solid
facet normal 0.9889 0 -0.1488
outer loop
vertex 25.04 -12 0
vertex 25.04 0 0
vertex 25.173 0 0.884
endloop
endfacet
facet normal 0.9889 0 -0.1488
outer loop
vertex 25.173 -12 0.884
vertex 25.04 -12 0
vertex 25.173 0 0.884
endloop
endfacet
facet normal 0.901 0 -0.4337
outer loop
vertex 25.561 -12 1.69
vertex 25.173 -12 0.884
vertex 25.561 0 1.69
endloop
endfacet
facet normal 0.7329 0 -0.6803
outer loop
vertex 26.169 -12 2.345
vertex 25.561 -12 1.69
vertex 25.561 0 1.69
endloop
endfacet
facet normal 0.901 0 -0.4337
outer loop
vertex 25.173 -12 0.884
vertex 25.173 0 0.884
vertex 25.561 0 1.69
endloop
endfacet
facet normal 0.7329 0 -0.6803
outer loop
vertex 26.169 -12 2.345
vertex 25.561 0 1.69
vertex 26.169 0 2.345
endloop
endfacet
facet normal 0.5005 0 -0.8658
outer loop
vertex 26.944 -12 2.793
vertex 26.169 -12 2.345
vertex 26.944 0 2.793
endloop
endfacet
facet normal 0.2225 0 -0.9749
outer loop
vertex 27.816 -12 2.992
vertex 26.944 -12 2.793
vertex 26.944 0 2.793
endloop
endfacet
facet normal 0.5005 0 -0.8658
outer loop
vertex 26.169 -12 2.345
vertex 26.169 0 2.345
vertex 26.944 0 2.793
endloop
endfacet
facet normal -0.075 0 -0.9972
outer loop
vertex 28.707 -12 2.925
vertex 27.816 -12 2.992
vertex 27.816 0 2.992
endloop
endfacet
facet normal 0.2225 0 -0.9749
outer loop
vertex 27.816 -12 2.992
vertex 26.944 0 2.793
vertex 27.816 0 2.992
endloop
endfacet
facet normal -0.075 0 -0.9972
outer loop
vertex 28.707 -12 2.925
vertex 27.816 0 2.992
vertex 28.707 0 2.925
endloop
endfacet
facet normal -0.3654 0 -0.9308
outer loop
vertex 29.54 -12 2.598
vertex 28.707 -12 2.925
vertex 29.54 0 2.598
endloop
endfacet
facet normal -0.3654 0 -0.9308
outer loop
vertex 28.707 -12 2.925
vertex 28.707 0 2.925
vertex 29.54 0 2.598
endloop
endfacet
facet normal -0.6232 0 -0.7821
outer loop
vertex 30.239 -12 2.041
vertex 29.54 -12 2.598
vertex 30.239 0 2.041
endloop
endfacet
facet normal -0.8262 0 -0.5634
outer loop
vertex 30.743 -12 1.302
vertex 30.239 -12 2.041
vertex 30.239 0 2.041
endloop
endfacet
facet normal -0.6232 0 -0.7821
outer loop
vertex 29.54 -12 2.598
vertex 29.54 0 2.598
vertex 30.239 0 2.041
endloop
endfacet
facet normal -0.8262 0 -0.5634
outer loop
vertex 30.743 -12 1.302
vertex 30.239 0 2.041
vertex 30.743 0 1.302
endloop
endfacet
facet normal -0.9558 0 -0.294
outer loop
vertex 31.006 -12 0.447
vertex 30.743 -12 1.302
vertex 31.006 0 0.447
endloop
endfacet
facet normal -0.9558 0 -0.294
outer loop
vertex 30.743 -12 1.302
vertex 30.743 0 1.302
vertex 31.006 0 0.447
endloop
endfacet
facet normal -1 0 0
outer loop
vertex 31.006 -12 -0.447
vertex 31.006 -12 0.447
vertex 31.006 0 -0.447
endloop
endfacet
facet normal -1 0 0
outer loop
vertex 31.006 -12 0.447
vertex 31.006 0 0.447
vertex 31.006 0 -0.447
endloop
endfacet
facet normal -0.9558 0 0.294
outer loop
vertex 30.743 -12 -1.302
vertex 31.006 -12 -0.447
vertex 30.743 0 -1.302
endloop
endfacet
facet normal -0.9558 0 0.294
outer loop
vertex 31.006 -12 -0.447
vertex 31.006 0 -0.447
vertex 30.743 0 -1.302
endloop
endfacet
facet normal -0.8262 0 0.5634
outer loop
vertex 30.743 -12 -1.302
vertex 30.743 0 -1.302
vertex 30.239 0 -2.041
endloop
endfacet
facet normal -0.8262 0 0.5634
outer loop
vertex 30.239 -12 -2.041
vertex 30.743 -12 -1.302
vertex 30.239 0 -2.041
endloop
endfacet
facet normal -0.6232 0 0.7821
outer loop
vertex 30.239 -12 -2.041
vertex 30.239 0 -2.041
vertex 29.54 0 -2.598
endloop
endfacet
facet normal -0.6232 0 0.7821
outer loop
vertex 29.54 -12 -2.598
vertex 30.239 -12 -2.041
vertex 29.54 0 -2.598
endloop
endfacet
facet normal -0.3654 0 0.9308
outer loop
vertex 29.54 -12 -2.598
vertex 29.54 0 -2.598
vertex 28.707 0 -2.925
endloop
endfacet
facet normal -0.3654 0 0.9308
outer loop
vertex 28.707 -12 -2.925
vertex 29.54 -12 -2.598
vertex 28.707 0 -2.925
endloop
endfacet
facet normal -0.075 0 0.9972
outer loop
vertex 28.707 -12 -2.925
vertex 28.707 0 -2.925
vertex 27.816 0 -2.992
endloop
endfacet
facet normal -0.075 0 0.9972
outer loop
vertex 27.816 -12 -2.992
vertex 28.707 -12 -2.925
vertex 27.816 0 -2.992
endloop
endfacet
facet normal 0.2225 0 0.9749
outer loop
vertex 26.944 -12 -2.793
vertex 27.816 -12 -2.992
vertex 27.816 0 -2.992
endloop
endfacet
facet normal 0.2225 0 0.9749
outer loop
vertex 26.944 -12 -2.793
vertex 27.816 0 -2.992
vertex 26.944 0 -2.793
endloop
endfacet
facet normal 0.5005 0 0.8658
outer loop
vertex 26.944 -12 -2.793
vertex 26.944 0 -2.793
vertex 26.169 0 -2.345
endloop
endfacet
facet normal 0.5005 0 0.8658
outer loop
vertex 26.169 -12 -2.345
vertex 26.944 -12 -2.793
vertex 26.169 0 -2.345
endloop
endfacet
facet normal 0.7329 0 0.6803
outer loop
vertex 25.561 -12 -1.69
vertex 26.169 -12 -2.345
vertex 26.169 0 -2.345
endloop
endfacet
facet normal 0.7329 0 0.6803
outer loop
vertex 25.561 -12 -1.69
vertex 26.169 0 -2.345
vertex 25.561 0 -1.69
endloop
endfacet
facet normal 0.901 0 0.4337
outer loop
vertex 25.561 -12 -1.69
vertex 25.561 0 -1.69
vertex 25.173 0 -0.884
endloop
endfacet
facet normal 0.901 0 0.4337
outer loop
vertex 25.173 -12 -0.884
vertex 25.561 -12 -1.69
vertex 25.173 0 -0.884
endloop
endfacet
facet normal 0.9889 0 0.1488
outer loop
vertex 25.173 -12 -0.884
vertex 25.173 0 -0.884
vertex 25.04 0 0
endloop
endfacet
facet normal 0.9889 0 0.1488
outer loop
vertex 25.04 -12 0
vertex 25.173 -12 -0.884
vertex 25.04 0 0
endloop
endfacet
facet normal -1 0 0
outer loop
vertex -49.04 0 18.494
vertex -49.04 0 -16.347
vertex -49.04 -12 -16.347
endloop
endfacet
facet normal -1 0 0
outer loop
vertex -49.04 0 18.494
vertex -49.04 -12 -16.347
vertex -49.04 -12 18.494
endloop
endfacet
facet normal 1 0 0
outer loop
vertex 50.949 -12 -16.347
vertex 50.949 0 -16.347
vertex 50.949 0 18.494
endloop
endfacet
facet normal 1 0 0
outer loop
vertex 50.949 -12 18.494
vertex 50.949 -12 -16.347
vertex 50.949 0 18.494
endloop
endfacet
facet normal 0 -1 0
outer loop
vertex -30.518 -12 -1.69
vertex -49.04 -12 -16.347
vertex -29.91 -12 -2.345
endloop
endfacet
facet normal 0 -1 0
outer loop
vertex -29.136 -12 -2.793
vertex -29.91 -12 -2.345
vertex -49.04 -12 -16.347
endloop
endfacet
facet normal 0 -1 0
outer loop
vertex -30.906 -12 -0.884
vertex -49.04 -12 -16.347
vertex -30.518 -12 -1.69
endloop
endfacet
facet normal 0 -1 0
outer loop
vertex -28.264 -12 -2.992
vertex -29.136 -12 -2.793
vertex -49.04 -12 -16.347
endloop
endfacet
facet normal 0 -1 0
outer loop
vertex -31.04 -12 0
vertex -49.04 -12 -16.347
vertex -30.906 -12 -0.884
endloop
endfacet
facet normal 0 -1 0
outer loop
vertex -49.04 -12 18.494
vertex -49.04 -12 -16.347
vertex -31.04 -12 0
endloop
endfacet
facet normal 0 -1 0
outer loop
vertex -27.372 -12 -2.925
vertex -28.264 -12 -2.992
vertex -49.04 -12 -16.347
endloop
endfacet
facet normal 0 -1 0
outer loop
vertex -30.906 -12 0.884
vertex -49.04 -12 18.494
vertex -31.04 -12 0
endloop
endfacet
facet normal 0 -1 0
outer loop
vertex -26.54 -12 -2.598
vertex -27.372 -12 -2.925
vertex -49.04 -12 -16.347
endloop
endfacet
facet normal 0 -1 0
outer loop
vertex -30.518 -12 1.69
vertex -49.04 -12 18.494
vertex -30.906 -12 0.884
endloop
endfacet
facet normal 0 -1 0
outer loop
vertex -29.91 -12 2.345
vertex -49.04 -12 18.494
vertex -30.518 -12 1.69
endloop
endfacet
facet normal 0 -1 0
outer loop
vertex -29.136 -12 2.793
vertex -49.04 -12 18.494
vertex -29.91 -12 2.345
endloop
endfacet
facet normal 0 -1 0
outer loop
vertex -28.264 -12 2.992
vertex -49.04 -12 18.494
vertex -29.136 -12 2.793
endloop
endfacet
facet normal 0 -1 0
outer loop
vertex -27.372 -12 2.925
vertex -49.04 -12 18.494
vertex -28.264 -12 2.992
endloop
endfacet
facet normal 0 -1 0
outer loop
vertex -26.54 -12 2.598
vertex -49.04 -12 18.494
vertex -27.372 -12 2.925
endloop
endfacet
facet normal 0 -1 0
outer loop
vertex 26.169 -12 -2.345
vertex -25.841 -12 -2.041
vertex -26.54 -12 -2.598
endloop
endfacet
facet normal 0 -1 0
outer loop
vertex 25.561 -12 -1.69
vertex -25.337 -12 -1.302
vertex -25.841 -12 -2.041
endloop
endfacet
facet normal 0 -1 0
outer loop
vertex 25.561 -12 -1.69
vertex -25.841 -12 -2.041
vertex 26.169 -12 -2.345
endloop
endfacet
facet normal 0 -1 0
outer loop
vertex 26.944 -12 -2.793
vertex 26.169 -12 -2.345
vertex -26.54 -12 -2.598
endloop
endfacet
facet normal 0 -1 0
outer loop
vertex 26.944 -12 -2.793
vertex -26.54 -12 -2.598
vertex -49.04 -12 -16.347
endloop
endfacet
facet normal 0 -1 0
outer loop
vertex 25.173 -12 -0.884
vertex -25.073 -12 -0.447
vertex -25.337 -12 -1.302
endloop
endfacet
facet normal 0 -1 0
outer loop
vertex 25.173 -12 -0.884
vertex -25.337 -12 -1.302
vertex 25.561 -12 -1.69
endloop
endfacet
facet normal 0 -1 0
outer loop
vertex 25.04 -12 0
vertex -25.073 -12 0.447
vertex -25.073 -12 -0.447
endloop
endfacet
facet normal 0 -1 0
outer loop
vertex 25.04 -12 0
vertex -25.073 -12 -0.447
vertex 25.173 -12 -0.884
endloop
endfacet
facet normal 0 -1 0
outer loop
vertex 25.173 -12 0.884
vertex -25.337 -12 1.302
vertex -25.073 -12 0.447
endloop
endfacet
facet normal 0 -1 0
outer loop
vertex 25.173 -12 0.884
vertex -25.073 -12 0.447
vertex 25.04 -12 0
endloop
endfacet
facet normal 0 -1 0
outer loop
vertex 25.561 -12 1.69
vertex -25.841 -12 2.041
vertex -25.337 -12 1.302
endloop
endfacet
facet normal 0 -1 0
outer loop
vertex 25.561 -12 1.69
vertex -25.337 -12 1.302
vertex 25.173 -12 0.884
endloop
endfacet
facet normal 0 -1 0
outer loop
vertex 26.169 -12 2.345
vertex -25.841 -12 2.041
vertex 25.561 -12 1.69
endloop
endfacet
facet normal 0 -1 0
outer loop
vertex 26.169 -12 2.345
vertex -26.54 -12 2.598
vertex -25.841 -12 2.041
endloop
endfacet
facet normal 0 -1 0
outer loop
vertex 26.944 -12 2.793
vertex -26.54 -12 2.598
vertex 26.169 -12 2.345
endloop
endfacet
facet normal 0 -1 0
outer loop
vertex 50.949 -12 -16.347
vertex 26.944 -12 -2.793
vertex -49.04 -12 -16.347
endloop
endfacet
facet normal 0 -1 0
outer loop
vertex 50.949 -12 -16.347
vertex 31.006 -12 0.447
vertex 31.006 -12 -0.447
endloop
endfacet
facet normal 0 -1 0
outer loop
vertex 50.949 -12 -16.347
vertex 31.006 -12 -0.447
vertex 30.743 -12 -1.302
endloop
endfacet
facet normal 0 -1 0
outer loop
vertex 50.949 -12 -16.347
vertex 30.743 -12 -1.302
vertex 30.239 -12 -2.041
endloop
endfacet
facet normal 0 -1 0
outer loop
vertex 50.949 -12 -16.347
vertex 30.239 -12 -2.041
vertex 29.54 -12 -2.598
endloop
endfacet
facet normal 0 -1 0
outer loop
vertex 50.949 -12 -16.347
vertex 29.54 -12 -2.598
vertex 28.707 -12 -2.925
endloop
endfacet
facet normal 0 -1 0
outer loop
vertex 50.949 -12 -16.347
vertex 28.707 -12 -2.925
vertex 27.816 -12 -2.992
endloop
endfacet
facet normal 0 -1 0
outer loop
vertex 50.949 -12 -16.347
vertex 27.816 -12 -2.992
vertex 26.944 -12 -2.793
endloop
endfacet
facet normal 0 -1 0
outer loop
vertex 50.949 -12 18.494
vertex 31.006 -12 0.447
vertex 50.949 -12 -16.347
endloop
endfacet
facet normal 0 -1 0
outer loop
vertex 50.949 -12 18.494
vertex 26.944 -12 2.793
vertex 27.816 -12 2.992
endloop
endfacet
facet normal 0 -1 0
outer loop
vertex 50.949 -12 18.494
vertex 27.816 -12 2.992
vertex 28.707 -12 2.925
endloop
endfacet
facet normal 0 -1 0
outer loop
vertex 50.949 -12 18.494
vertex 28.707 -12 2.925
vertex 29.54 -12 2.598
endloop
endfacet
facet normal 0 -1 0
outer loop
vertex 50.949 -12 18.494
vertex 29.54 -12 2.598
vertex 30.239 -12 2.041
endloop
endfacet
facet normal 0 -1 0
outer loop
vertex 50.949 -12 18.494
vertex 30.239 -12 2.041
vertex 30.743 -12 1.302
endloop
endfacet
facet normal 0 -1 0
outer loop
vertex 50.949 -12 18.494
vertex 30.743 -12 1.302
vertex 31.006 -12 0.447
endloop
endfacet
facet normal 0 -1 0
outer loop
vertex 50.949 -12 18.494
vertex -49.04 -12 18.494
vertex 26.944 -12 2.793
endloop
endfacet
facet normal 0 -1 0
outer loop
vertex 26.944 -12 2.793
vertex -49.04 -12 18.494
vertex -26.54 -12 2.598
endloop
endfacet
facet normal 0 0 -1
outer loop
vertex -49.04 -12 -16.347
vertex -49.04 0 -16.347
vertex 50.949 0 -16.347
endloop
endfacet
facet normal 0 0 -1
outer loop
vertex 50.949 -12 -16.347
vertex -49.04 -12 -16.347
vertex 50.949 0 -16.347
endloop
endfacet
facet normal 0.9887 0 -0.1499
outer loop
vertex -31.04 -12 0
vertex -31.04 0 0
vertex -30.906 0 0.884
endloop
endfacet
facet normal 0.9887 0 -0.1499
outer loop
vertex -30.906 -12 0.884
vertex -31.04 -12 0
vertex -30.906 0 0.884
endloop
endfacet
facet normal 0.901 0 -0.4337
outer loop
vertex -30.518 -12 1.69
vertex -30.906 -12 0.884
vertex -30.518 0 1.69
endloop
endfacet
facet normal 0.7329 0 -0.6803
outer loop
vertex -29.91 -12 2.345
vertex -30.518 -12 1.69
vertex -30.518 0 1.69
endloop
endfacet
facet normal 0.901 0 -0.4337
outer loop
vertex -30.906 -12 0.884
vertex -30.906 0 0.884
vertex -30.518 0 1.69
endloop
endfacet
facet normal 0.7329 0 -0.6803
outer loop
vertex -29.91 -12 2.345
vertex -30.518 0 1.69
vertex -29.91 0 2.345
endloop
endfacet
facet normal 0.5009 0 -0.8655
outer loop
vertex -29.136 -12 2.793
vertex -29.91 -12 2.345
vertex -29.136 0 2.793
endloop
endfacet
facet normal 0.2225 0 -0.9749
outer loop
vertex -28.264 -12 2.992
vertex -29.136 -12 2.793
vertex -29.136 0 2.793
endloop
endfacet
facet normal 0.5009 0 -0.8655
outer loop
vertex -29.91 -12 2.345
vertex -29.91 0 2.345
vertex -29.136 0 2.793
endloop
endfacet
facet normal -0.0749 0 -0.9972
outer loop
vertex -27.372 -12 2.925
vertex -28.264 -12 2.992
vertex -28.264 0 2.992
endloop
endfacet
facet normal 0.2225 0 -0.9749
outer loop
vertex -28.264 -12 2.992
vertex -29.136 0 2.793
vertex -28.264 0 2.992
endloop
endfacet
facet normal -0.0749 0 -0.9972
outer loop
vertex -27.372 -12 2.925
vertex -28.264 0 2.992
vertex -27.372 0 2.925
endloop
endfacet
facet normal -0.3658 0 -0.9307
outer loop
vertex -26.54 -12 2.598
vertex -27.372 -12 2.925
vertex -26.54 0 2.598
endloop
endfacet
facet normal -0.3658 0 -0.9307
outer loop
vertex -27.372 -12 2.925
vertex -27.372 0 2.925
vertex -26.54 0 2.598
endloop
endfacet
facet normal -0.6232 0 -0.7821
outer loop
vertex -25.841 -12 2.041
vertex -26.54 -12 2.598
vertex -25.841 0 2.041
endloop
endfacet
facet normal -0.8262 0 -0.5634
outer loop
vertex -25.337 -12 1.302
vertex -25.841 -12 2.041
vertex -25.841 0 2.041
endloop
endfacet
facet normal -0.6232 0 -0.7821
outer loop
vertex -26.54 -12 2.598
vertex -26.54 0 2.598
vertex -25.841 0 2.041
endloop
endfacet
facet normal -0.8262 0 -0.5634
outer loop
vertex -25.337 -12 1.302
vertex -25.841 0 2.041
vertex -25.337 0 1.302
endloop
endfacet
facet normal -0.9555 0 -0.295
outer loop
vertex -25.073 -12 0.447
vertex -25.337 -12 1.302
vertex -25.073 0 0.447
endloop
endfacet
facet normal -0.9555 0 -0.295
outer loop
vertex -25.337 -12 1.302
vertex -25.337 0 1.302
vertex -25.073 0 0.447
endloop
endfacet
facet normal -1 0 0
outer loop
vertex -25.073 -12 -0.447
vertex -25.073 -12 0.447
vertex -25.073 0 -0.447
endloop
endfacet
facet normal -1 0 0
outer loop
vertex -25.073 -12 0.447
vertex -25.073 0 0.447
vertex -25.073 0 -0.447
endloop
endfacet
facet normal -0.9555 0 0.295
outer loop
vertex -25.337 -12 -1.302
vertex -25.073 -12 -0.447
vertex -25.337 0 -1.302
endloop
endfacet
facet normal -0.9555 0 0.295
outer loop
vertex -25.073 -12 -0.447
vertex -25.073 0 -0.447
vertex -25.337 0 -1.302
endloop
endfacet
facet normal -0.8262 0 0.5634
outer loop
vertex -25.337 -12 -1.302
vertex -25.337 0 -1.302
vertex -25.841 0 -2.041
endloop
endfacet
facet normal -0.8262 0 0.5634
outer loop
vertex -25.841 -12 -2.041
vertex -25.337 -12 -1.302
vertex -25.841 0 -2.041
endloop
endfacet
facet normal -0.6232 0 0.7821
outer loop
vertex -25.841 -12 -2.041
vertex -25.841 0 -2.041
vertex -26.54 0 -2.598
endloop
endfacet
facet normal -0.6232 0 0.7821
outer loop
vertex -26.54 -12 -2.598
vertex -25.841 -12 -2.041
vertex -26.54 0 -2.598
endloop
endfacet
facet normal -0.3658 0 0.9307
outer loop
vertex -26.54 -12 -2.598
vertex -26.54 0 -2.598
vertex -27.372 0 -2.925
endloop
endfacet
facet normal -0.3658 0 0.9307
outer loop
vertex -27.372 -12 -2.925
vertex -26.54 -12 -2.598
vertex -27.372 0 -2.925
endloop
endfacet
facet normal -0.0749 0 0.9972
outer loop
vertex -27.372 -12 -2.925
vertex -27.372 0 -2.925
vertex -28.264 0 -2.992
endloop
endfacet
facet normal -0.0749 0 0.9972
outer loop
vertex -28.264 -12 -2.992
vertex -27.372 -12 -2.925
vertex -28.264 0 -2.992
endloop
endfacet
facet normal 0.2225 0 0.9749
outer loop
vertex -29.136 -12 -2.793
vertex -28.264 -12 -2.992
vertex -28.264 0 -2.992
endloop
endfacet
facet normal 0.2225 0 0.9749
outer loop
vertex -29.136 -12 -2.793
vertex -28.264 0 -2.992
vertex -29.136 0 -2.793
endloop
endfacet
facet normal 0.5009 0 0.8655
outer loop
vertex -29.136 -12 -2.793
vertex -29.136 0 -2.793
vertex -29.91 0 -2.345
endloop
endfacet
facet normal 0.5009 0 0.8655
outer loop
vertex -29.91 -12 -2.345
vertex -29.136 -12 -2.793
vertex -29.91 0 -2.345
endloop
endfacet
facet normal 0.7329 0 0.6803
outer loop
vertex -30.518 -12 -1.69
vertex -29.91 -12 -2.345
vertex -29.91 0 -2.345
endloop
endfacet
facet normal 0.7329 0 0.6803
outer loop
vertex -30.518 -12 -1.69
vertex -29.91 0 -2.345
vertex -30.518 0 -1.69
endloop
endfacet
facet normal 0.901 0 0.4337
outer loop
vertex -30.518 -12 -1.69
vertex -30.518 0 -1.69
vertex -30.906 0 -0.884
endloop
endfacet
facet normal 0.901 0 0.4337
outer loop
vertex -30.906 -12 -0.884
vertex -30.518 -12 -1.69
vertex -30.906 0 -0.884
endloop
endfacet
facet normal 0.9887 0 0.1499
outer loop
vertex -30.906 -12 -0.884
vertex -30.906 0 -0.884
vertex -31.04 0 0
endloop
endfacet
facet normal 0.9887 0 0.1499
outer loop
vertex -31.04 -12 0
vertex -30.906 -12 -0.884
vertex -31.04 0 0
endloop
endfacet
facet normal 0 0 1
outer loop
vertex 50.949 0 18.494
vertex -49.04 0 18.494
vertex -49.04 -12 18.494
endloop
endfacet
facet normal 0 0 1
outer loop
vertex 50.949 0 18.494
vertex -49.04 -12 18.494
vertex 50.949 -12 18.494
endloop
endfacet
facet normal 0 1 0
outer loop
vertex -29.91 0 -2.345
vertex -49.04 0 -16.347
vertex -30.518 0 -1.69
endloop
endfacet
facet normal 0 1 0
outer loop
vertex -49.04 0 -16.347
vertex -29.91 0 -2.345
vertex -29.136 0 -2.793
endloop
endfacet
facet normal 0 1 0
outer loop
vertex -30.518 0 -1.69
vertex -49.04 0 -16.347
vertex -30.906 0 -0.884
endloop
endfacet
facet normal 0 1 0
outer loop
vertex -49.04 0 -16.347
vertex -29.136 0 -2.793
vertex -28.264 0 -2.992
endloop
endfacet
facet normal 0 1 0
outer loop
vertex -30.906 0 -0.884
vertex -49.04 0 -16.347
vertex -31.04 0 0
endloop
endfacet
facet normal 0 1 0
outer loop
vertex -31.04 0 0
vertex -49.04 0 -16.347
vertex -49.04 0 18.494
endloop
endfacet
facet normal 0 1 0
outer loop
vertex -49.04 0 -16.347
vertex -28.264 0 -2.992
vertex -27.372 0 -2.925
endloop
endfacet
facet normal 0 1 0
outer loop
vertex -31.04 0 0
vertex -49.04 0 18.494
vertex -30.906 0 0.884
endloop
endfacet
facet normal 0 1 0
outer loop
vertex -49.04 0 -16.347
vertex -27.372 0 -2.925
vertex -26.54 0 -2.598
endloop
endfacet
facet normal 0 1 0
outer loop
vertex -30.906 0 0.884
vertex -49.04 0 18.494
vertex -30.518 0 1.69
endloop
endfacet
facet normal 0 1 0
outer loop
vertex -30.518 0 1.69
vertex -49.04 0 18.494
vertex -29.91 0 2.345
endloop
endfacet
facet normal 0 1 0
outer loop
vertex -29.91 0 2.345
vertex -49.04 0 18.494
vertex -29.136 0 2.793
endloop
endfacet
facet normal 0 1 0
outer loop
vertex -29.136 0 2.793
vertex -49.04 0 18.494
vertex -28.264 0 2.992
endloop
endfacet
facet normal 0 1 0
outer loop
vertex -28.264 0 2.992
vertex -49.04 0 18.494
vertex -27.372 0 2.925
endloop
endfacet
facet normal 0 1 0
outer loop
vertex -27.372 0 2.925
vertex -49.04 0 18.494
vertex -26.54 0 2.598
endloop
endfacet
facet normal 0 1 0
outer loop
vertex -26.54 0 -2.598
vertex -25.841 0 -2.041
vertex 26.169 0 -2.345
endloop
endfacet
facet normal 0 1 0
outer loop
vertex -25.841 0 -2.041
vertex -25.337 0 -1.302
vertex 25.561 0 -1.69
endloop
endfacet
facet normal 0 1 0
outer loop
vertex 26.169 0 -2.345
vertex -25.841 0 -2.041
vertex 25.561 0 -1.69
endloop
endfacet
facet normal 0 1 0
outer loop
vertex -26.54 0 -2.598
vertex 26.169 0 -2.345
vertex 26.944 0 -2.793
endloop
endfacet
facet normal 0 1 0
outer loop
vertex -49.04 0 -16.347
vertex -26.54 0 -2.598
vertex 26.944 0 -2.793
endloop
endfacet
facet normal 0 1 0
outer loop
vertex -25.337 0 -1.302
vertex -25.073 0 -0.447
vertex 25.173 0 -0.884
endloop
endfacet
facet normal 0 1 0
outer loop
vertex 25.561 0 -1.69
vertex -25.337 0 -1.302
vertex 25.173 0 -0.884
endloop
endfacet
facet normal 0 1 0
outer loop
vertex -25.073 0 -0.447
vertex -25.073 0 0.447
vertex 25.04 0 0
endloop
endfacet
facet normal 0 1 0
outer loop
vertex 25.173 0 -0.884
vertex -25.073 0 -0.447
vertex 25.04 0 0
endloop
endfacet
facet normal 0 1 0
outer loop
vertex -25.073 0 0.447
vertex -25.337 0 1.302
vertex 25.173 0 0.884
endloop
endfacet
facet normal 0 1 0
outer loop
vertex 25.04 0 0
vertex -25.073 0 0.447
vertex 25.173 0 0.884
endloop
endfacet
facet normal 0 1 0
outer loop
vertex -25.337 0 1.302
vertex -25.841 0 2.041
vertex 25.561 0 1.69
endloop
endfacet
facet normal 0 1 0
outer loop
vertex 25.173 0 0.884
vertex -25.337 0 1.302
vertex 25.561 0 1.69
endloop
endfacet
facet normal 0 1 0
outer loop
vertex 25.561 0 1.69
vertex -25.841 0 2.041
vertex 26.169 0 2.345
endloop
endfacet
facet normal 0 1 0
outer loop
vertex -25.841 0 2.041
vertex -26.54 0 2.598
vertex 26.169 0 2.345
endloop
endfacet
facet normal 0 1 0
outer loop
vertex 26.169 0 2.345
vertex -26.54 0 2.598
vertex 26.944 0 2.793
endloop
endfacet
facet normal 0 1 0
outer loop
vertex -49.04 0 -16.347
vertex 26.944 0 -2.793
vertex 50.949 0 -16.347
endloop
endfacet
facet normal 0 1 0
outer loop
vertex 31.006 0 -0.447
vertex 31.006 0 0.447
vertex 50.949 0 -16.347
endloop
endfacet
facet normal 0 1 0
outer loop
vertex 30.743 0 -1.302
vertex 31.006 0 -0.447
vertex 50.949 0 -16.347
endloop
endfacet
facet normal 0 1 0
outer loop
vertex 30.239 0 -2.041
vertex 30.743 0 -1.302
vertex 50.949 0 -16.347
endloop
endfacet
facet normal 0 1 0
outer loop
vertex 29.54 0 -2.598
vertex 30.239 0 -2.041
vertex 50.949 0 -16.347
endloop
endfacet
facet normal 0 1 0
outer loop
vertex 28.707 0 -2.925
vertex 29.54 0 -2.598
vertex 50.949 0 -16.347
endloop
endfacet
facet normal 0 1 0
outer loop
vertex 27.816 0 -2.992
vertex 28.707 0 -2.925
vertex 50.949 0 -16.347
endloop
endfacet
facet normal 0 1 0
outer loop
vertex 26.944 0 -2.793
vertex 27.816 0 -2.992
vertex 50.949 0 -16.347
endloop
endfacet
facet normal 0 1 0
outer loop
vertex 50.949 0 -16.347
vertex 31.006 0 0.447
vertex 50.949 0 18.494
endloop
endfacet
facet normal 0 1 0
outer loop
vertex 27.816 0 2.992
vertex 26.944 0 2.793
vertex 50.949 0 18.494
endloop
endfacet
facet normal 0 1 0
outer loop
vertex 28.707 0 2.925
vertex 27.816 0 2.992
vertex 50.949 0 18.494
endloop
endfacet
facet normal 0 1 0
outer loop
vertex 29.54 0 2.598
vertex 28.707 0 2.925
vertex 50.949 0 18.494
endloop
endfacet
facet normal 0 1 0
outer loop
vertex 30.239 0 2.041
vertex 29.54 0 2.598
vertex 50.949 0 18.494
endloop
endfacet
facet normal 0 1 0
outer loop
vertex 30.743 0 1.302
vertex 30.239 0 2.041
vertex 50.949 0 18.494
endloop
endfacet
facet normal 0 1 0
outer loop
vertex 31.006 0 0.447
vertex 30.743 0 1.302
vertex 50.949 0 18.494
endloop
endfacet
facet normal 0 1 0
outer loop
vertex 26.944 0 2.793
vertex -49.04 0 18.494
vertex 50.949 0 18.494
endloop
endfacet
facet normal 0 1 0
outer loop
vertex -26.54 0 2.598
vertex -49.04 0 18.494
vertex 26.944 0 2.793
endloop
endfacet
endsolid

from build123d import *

# Parameters (mm, degrees)
F0_W     = 99.988638
F0_H     = 34.840912
F1_DEPTH = 12
F2_R     = 3
F3_DEPTH = 75


with BuildPart() as f1:
    # F0 (on Front) → F1 (new body)
    with BuildSketch(Plane.XZ):
        with Locations((0.954544, 1.073864)):
            Rectangle(F0_W, F0_H)
    extrude(amount=F1_DEPTH)

    # F2 (on face) → F3 (cut)
    with BuildSketch(Plane(origin=(0, 0, 0), x_dir=(-1, 0, 0), z_dir=(0, 1, 0))):
        with Locations((-28.039774, 0)):
            Circle(F2_R)
        with Locations((28.039774, 0)):
            Circle(F2_R)
    extrude(amount=-F3_DEPTH, mode=Mode.SUBTRACT)


solid = f1.part
